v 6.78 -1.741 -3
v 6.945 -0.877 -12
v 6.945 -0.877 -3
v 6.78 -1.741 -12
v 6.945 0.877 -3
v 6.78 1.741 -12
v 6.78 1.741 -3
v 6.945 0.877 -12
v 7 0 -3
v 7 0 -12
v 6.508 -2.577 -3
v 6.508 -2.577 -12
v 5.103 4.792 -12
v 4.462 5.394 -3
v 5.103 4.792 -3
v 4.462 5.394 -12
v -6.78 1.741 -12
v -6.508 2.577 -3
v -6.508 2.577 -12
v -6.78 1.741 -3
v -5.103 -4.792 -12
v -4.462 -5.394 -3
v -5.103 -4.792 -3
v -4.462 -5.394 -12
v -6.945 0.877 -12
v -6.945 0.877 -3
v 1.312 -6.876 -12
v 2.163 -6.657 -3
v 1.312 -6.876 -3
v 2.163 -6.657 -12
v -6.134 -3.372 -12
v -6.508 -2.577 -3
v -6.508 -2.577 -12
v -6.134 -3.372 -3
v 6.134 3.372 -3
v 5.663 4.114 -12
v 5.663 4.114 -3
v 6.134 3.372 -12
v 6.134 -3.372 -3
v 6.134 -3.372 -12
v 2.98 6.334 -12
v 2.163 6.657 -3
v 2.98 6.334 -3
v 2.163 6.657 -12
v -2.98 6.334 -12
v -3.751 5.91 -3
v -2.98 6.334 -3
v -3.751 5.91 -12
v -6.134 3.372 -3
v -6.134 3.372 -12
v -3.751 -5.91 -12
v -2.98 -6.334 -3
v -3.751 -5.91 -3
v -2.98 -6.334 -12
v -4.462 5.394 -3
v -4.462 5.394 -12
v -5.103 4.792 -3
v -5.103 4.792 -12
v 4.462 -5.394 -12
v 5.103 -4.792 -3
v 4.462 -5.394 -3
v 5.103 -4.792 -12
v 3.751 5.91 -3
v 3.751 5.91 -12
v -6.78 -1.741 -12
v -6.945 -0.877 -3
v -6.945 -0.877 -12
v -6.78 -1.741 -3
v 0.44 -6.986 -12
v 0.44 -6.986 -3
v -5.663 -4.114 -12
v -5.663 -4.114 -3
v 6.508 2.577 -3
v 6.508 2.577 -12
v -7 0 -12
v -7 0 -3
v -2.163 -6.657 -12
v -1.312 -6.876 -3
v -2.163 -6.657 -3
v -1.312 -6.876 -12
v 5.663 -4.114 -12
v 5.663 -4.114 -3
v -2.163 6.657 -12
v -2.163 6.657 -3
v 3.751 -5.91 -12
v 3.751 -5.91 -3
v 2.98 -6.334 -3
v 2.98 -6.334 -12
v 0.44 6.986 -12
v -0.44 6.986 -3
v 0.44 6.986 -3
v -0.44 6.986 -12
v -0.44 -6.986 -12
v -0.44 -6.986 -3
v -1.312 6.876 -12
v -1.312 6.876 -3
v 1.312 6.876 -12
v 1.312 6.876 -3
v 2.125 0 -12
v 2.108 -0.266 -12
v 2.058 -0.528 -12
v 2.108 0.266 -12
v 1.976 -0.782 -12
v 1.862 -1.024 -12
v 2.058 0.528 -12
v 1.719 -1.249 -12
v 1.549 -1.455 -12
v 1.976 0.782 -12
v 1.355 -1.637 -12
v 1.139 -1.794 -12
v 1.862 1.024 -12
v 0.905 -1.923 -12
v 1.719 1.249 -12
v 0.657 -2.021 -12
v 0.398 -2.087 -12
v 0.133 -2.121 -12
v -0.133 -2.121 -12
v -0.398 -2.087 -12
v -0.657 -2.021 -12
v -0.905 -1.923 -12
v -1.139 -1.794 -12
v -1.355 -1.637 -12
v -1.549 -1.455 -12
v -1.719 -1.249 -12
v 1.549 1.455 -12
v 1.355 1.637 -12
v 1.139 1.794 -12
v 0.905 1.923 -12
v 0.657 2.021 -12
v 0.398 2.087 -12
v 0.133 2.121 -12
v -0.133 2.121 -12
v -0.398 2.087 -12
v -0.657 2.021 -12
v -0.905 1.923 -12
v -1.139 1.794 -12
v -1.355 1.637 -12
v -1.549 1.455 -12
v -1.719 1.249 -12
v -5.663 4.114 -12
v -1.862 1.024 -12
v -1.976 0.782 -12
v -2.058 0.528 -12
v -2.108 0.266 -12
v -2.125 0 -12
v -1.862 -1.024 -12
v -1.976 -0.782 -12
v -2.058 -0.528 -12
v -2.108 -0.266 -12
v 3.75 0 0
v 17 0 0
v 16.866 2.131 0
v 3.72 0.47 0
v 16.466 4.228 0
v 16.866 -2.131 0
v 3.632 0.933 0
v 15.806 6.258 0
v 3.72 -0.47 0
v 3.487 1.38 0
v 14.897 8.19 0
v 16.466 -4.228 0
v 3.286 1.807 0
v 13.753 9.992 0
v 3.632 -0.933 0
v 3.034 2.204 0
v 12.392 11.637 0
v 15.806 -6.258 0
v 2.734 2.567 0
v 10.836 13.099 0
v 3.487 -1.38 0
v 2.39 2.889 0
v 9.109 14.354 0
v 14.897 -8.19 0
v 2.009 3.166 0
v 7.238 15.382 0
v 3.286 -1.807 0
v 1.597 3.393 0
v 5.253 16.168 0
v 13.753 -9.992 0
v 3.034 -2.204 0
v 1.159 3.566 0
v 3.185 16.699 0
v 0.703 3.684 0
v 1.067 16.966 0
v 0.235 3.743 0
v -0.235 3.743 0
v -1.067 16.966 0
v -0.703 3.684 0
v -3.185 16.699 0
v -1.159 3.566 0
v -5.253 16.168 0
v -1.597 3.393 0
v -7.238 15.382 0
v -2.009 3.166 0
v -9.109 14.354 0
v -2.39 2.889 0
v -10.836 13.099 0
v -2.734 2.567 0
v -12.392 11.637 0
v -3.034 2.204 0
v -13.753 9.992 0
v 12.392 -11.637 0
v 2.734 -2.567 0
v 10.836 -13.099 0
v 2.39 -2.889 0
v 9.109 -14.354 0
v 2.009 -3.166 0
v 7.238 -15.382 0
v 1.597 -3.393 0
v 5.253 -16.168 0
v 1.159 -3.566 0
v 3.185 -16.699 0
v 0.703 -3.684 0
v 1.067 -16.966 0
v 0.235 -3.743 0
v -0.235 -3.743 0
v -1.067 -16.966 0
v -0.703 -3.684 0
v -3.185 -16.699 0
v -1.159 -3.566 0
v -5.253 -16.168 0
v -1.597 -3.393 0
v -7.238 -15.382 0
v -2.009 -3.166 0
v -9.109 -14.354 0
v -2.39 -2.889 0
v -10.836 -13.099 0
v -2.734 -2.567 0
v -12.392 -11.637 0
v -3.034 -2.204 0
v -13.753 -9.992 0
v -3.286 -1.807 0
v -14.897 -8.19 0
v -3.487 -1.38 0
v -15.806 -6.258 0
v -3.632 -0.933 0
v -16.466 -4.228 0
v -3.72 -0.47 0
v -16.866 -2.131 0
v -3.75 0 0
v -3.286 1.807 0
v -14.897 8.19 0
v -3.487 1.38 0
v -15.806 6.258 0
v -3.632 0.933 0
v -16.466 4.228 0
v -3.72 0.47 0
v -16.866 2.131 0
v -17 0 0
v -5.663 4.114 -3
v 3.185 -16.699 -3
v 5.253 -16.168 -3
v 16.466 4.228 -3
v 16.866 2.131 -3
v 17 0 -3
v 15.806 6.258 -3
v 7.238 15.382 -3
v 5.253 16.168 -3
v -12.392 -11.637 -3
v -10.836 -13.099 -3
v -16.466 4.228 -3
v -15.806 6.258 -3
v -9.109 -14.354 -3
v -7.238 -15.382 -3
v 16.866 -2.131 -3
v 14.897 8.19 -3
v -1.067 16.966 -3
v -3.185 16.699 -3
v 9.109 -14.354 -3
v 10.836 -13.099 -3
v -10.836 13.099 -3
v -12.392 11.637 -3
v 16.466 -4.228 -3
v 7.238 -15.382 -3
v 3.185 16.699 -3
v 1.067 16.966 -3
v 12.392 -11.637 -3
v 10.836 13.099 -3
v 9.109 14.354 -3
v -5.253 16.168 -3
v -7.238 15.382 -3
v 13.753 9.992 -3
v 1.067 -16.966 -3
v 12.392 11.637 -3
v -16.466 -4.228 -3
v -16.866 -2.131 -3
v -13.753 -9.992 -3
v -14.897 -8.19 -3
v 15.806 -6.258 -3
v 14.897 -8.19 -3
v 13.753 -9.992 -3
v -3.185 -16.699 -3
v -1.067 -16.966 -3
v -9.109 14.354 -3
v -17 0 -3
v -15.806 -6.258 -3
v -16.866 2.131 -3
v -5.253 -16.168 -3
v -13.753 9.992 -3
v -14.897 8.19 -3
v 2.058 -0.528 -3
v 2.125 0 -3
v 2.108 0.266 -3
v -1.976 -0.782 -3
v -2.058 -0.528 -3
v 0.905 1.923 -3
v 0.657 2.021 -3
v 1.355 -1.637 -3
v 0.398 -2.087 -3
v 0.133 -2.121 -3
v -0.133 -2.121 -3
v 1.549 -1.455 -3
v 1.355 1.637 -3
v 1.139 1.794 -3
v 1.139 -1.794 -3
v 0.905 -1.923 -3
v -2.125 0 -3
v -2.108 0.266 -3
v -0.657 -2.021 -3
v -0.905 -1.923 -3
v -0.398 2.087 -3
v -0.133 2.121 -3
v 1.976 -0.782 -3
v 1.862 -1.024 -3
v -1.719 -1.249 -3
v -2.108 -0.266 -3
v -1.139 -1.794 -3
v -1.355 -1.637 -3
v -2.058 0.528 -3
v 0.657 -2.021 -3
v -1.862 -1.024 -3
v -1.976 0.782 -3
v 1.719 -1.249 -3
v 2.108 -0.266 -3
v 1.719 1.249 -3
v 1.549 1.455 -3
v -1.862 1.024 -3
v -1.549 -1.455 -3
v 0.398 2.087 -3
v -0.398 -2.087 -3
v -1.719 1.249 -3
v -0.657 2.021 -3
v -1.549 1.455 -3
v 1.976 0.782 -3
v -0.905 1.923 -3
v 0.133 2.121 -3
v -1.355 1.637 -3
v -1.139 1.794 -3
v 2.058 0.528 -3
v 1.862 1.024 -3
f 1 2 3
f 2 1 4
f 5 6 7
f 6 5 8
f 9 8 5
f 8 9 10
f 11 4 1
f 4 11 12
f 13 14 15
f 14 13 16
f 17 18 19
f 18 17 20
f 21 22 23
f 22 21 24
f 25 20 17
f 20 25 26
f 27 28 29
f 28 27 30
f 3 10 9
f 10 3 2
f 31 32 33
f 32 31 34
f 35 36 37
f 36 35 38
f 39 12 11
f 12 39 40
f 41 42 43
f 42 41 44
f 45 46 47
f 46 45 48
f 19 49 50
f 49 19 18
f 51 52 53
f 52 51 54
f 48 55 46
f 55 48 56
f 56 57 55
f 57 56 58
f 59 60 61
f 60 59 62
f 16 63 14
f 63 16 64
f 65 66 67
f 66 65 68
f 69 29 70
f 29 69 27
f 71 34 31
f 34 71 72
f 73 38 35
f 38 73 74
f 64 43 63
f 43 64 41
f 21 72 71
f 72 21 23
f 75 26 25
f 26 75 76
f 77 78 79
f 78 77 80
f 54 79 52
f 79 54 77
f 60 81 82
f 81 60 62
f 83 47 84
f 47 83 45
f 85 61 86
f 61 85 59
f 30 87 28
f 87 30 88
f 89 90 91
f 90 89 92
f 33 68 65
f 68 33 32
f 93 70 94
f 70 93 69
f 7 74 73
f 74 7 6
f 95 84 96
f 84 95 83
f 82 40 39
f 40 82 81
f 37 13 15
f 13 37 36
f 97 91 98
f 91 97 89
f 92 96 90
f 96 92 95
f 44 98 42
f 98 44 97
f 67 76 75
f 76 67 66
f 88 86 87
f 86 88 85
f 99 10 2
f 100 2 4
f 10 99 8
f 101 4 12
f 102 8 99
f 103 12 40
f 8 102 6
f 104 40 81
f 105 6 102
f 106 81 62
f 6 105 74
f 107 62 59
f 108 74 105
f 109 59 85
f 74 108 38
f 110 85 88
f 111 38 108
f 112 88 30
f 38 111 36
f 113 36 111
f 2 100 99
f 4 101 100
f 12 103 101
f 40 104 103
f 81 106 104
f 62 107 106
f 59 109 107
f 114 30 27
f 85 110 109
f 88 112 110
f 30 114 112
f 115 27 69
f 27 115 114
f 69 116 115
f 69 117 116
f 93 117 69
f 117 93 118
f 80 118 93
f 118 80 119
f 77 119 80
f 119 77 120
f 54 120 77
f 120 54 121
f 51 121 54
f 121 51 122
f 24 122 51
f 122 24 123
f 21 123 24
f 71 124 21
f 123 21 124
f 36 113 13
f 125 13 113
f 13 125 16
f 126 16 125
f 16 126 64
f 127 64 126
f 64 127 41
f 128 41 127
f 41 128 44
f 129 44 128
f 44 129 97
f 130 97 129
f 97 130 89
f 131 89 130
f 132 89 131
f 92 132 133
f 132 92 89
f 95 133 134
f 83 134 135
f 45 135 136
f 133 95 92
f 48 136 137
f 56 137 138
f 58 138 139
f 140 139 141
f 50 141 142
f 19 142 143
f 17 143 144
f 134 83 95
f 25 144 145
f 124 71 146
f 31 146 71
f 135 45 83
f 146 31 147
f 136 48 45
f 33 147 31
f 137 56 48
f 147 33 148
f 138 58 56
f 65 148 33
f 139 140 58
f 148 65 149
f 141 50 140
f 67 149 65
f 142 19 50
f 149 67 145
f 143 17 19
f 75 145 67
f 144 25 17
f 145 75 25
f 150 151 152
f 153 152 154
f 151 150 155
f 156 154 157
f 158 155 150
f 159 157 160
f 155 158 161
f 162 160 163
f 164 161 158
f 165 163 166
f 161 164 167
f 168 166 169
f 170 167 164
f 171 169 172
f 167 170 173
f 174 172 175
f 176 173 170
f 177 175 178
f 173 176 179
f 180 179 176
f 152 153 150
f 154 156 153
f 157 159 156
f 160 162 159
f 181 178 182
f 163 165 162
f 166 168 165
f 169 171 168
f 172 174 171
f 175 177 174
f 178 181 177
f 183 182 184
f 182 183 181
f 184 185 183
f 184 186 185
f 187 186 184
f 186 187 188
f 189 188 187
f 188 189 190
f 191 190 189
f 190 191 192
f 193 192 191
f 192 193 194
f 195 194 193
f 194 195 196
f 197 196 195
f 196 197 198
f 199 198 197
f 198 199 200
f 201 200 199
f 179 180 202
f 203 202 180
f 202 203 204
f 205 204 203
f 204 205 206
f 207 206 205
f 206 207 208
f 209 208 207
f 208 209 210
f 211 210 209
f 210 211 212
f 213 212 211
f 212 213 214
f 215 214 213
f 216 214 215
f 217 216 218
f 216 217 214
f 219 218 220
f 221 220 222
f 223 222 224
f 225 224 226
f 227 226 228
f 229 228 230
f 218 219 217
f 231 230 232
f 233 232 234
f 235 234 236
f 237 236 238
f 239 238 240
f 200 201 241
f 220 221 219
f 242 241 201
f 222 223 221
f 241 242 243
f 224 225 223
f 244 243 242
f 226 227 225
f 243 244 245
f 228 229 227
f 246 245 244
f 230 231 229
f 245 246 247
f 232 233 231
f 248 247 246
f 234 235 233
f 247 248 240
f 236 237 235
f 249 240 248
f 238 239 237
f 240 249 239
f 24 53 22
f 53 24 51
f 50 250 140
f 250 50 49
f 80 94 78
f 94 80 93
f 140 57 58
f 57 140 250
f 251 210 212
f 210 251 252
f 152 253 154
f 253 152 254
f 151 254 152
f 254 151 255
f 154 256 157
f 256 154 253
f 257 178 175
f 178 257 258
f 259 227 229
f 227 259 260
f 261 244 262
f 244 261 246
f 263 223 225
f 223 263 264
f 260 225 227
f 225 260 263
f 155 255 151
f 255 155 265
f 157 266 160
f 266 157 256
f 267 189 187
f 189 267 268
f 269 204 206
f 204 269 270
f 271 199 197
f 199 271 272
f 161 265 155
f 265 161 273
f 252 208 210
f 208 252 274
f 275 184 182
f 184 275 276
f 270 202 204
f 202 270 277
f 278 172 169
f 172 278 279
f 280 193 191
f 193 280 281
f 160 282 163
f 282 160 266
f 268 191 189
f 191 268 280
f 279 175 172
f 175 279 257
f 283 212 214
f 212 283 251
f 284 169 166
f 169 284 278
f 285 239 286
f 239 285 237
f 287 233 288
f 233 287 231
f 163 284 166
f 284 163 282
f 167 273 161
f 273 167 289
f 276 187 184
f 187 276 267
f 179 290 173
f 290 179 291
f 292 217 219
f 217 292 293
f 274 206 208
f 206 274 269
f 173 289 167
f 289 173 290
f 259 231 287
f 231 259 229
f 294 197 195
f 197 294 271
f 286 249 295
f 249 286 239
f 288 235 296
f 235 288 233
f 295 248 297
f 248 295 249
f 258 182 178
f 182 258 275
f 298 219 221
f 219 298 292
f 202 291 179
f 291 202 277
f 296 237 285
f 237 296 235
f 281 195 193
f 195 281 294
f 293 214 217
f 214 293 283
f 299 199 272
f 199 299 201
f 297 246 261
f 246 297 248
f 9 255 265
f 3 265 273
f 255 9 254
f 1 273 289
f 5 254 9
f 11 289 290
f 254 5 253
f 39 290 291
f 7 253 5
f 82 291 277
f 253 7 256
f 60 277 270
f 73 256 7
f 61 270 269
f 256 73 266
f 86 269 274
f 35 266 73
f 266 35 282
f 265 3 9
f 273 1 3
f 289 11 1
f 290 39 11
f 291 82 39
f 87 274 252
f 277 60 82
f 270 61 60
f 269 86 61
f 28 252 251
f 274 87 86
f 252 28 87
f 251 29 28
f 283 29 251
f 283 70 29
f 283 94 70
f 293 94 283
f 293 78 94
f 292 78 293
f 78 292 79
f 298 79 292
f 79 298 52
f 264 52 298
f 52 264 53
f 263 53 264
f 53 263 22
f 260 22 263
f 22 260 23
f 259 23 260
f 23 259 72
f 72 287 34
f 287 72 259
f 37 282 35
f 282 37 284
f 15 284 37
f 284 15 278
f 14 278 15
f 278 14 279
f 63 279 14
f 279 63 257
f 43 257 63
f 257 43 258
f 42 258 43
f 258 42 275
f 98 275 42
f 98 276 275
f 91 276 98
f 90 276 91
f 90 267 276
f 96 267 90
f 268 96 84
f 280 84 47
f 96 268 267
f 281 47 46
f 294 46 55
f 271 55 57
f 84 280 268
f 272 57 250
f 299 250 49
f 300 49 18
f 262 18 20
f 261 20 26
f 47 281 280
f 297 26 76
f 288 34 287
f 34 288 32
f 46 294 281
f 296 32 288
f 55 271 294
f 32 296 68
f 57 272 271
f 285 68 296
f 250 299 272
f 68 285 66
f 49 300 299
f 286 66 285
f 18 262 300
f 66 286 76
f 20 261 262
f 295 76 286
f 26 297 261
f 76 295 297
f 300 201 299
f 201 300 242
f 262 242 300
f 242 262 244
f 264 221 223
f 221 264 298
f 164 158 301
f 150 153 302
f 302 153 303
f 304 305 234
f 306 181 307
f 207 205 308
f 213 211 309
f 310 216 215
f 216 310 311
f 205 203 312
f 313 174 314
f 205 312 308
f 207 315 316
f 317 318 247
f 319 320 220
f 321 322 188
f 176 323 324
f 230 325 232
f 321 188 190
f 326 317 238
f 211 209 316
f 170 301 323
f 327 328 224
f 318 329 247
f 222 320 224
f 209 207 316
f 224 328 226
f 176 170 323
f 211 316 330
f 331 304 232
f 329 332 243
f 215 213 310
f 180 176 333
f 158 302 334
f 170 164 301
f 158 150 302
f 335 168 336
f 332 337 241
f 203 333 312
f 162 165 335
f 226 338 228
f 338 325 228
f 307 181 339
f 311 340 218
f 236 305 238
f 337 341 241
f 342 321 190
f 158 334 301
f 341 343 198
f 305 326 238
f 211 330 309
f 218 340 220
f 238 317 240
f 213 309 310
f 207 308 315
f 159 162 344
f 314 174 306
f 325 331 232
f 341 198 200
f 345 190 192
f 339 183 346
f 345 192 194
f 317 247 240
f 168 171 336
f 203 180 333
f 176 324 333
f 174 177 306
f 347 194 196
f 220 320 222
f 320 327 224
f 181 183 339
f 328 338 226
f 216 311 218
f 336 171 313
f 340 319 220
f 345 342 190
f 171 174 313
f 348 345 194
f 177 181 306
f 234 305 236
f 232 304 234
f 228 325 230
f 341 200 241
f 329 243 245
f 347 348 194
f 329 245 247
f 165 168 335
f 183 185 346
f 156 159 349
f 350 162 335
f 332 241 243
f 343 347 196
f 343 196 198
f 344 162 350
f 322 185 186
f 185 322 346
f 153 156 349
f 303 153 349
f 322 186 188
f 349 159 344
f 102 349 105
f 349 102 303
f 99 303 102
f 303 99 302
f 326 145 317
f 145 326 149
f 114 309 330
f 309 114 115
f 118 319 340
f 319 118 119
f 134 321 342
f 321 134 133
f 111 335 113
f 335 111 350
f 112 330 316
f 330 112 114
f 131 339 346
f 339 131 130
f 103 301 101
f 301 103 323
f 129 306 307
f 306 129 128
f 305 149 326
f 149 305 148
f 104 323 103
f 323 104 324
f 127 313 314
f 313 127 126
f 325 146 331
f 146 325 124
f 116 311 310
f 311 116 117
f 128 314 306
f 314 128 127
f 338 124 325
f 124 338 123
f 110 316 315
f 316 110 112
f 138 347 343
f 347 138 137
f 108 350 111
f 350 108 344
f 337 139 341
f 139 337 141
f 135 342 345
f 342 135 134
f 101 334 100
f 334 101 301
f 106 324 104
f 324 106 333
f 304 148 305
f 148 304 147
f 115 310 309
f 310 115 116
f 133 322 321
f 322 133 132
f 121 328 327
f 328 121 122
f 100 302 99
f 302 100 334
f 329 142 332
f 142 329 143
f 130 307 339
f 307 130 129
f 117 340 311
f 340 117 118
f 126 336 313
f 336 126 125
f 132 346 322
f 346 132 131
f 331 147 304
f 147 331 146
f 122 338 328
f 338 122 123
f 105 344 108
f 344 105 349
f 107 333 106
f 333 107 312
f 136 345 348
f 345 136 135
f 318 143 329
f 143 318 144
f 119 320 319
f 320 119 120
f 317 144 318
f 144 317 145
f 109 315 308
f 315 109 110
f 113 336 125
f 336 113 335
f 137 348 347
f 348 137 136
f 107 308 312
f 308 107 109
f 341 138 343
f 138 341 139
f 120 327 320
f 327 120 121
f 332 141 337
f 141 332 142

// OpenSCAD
$fn = 50;


difference() {
	union() {
		translate(v = [0, 0, -12.0000000000]) {
			cylinder(h = 12, r = 7.0000000000);
		}
		translate(v = [0, 0, -3.0000000000]) {
			cylinder(h = 3, r = 17.0000000000);
		}
	}
	union() {
		translate(v = [0, 0, 0]) {
			rotate(a = [0, 0, 0]) {
				difference() {
					union() {
						#translate(v = [0, 0, -12.0000000000]) {
							cylinder(h = 12, r = 2.0000000000);
						}
						#translate(v = [0, 0, -3]) {
							cylinder(h = 3, r1 = 2.1250000000, r2 = 3.7500000000);
						}
						#translate(v = [0, 0, -12.0000000000]) {
							cylinder(h = 12, r = 2.1250000000);
						}
						#translate(v = [0, 0, -12.0000000000]) {
							cylinder(h = 12, r = 2.0000000000);
						}
					}
					union();
				}
			}
		}
	}
}
